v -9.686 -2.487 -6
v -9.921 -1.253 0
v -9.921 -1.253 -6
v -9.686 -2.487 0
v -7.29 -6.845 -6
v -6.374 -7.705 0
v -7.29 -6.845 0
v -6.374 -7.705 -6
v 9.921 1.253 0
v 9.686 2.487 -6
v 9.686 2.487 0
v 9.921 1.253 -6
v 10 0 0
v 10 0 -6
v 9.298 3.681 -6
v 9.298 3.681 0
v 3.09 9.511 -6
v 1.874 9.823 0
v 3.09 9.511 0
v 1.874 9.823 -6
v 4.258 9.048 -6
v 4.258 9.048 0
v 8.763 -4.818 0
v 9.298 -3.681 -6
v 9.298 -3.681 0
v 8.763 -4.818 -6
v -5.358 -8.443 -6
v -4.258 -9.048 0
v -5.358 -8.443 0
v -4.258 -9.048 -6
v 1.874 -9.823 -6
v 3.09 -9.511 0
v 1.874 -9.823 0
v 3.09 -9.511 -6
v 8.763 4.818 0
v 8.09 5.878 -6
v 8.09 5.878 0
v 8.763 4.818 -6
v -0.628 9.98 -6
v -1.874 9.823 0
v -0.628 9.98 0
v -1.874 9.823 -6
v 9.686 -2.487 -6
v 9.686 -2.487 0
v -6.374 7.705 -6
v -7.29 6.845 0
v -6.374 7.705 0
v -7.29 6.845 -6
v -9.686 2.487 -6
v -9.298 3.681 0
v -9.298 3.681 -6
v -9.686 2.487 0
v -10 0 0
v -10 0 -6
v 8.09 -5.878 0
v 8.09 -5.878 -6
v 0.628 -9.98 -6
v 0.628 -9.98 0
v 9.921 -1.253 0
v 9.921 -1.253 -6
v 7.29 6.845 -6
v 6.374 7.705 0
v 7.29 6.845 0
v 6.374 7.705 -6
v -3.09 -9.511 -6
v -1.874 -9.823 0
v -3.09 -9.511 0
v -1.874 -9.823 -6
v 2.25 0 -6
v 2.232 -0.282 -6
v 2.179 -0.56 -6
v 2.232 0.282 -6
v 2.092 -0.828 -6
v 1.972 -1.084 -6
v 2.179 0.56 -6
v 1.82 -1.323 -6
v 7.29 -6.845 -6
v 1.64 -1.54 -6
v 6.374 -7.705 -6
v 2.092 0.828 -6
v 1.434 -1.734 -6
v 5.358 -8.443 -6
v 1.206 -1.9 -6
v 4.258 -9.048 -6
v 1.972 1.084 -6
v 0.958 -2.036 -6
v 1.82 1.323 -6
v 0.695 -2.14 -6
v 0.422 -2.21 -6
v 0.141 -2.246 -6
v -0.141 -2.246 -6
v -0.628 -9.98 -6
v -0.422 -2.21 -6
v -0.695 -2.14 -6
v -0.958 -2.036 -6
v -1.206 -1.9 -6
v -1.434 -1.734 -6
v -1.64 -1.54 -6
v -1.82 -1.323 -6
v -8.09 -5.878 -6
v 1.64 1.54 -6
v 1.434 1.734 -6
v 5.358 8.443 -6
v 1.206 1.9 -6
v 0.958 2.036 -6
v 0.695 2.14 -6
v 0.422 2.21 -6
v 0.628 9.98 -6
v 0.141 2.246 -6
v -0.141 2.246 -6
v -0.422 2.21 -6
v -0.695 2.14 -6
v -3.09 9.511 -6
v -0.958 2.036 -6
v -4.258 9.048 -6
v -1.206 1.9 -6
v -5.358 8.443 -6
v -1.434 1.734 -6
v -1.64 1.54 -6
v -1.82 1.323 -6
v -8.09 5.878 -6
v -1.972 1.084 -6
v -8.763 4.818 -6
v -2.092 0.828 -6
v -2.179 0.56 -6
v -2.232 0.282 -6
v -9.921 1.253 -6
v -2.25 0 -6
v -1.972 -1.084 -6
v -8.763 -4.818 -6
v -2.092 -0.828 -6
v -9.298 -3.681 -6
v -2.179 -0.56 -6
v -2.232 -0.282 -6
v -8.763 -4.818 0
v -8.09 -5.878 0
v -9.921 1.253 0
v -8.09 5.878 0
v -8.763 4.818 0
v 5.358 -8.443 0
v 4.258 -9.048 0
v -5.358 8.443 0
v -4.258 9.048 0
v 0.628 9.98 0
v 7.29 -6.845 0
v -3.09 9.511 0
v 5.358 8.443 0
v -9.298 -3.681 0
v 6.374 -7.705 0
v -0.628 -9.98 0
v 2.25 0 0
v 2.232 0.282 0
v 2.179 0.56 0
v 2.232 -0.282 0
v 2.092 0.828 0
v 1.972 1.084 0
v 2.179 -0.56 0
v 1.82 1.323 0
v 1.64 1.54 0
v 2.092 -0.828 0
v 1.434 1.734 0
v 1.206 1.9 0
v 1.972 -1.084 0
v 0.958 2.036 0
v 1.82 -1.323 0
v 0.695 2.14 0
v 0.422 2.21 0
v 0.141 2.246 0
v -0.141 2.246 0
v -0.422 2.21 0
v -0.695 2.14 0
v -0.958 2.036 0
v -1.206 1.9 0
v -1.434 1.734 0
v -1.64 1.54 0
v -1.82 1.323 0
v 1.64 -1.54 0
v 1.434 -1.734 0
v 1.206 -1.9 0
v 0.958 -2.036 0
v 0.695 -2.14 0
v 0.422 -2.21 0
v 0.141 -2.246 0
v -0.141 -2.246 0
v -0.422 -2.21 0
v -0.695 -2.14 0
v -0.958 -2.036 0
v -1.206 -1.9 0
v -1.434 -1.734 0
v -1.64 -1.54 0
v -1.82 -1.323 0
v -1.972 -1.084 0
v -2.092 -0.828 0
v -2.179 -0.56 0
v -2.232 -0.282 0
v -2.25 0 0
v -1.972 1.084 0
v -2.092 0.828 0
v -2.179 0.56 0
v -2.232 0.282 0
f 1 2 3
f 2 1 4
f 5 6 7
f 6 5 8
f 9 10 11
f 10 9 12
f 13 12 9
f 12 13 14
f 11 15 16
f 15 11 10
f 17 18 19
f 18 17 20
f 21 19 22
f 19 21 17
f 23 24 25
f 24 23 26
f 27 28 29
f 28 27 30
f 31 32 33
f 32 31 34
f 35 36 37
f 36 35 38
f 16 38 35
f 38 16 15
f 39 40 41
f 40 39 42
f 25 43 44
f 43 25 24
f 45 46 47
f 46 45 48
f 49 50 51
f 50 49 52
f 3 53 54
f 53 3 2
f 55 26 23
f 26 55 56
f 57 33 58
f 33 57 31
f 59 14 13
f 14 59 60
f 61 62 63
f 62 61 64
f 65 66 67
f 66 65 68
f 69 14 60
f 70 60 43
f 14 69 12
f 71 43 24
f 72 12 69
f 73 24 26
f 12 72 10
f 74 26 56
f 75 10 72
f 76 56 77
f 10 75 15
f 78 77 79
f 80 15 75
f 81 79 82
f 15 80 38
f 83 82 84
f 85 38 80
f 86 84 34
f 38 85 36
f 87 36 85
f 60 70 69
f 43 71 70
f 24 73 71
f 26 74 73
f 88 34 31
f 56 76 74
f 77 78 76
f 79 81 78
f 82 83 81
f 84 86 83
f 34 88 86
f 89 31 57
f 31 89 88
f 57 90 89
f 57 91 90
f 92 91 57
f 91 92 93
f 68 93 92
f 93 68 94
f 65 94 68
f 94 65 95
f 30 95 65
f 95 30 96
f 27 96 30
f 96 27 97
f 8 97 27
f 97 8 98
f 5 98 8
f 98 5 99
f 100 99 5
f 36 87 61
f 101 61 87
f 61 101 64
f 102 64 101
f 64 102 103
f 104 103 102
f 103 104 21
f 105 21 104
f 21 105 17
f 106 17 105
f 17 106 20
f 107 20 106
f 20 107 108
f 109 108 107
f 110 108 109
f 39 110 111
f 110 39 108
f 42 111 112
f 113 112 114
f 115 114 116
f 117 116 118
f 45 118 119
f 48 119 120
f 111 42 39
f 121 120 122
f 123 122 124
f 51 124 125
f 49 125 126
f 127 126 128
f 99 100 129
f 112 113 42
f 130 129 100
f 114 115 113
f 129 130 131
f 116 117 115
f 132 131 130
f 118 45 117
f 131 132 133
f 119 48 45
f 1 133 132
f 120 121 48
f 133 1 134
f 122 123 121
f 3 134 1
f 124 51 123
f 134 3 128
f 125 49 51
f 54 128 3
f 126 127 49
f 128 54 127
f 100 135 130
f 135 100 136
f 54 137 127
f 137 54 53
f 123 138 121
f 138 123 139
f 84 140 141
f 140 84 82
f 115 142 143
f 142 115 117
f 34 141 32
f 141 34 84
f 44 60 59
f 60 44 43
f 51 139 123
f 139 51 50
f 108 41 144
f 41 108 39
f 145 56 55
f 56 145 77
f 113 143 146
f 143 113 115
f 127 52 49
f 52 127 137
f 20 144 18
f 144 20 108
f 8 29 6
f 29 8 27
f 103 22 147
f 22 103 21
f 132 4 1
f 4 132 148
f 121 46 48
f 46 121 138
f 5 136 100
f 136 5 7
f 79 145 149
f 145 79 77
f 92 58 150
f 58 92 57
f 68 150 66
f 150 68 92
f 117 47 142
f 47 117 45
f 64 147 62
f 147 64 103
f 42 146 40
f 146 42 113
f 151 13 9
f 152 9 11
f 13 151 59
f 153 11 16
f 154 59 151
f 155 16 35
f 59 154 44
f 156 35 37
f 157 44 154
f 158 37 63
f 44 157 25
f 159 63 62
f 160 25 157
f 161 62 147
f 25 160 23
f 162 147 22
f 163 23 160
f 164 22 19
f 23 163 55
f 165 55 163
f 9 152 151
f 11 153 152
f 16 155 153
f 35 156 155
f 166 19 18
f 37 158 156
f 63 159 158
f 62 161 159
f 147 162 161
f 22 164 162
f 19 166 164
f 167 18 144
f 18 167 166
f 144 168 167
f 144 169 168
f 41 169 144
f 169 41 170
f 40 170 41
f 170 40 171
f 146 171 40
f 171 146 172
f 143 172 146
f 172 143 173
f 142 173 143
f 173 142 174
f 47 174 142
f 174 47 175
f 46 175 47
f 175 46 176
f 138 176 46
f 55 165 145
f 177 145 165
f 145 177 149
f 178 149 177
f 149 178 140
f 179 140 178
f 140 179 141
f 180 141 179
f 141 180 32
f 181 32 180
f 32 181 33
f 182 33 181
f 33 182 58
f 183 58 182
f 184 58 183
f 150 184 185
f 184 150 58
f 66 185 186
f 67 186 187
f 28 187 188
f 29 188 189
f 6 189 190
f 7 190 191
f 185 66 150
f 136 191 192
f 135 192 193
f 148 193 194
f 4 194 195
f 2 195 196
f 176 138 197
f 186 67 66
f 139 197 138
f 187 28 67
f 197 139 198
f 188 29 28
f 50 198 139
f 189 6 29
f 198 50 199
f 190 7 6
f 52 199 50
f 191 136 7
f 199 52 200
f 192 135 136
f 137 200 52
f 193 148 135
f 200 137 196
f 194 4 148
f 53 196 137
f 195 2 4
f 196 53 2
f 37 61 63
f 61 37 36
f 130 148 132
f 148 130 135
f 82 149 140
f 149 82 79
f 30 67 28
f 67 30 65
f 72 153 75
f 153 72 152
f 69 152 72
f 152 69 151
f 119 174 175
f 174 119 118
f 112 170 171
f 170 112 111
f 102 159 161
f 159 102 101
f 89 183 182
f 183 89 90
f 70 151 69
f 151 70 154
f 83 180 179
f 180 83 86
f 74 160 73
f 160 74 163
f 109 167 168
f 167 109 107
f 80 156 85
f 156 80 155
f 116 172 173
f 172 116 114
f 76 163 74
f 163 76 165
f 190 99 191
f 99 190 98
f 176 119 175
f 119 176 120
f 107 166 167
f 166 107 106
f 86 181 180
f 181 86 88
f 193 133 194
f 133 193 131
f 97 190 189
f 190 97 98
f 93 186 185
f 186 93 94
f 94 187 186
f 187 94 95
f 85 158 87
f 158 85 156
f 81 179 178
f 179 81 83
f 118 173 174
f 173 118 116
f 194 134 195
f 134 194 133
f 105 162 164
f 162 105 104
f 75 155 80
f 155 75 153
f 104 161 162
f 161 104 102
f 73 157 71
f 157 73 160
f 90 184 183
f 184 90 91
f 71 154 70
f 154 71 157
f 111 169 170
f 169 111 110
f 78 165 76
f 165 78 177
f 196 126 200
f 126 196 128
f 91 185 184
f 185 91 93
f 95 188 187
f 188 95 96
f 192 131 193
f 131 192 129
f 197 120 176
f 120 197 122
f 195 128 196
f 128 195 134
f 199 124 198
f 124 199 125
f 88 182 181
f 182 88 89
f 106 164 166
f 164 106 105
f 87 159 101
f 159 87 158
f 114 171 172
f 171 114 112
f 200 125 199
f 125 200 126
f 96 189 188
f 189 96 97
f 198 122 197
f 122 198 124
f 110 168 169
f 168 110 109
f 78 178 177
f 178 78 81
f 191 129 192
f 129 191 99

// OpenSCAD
$fn = 50;


difference() {
	union() {
		translate(v = [0, 0, -6.0000000000]) {
			cylinder(h = 6, r = 10.0000000000);
		}
		cylinder(h = 0, r = 20.0000000000);
	}
	union() {
		#translate(v = [0, 0, -6]) {
			cylinder(h = 6, r = 2.2500000000);
		}
	}
}
